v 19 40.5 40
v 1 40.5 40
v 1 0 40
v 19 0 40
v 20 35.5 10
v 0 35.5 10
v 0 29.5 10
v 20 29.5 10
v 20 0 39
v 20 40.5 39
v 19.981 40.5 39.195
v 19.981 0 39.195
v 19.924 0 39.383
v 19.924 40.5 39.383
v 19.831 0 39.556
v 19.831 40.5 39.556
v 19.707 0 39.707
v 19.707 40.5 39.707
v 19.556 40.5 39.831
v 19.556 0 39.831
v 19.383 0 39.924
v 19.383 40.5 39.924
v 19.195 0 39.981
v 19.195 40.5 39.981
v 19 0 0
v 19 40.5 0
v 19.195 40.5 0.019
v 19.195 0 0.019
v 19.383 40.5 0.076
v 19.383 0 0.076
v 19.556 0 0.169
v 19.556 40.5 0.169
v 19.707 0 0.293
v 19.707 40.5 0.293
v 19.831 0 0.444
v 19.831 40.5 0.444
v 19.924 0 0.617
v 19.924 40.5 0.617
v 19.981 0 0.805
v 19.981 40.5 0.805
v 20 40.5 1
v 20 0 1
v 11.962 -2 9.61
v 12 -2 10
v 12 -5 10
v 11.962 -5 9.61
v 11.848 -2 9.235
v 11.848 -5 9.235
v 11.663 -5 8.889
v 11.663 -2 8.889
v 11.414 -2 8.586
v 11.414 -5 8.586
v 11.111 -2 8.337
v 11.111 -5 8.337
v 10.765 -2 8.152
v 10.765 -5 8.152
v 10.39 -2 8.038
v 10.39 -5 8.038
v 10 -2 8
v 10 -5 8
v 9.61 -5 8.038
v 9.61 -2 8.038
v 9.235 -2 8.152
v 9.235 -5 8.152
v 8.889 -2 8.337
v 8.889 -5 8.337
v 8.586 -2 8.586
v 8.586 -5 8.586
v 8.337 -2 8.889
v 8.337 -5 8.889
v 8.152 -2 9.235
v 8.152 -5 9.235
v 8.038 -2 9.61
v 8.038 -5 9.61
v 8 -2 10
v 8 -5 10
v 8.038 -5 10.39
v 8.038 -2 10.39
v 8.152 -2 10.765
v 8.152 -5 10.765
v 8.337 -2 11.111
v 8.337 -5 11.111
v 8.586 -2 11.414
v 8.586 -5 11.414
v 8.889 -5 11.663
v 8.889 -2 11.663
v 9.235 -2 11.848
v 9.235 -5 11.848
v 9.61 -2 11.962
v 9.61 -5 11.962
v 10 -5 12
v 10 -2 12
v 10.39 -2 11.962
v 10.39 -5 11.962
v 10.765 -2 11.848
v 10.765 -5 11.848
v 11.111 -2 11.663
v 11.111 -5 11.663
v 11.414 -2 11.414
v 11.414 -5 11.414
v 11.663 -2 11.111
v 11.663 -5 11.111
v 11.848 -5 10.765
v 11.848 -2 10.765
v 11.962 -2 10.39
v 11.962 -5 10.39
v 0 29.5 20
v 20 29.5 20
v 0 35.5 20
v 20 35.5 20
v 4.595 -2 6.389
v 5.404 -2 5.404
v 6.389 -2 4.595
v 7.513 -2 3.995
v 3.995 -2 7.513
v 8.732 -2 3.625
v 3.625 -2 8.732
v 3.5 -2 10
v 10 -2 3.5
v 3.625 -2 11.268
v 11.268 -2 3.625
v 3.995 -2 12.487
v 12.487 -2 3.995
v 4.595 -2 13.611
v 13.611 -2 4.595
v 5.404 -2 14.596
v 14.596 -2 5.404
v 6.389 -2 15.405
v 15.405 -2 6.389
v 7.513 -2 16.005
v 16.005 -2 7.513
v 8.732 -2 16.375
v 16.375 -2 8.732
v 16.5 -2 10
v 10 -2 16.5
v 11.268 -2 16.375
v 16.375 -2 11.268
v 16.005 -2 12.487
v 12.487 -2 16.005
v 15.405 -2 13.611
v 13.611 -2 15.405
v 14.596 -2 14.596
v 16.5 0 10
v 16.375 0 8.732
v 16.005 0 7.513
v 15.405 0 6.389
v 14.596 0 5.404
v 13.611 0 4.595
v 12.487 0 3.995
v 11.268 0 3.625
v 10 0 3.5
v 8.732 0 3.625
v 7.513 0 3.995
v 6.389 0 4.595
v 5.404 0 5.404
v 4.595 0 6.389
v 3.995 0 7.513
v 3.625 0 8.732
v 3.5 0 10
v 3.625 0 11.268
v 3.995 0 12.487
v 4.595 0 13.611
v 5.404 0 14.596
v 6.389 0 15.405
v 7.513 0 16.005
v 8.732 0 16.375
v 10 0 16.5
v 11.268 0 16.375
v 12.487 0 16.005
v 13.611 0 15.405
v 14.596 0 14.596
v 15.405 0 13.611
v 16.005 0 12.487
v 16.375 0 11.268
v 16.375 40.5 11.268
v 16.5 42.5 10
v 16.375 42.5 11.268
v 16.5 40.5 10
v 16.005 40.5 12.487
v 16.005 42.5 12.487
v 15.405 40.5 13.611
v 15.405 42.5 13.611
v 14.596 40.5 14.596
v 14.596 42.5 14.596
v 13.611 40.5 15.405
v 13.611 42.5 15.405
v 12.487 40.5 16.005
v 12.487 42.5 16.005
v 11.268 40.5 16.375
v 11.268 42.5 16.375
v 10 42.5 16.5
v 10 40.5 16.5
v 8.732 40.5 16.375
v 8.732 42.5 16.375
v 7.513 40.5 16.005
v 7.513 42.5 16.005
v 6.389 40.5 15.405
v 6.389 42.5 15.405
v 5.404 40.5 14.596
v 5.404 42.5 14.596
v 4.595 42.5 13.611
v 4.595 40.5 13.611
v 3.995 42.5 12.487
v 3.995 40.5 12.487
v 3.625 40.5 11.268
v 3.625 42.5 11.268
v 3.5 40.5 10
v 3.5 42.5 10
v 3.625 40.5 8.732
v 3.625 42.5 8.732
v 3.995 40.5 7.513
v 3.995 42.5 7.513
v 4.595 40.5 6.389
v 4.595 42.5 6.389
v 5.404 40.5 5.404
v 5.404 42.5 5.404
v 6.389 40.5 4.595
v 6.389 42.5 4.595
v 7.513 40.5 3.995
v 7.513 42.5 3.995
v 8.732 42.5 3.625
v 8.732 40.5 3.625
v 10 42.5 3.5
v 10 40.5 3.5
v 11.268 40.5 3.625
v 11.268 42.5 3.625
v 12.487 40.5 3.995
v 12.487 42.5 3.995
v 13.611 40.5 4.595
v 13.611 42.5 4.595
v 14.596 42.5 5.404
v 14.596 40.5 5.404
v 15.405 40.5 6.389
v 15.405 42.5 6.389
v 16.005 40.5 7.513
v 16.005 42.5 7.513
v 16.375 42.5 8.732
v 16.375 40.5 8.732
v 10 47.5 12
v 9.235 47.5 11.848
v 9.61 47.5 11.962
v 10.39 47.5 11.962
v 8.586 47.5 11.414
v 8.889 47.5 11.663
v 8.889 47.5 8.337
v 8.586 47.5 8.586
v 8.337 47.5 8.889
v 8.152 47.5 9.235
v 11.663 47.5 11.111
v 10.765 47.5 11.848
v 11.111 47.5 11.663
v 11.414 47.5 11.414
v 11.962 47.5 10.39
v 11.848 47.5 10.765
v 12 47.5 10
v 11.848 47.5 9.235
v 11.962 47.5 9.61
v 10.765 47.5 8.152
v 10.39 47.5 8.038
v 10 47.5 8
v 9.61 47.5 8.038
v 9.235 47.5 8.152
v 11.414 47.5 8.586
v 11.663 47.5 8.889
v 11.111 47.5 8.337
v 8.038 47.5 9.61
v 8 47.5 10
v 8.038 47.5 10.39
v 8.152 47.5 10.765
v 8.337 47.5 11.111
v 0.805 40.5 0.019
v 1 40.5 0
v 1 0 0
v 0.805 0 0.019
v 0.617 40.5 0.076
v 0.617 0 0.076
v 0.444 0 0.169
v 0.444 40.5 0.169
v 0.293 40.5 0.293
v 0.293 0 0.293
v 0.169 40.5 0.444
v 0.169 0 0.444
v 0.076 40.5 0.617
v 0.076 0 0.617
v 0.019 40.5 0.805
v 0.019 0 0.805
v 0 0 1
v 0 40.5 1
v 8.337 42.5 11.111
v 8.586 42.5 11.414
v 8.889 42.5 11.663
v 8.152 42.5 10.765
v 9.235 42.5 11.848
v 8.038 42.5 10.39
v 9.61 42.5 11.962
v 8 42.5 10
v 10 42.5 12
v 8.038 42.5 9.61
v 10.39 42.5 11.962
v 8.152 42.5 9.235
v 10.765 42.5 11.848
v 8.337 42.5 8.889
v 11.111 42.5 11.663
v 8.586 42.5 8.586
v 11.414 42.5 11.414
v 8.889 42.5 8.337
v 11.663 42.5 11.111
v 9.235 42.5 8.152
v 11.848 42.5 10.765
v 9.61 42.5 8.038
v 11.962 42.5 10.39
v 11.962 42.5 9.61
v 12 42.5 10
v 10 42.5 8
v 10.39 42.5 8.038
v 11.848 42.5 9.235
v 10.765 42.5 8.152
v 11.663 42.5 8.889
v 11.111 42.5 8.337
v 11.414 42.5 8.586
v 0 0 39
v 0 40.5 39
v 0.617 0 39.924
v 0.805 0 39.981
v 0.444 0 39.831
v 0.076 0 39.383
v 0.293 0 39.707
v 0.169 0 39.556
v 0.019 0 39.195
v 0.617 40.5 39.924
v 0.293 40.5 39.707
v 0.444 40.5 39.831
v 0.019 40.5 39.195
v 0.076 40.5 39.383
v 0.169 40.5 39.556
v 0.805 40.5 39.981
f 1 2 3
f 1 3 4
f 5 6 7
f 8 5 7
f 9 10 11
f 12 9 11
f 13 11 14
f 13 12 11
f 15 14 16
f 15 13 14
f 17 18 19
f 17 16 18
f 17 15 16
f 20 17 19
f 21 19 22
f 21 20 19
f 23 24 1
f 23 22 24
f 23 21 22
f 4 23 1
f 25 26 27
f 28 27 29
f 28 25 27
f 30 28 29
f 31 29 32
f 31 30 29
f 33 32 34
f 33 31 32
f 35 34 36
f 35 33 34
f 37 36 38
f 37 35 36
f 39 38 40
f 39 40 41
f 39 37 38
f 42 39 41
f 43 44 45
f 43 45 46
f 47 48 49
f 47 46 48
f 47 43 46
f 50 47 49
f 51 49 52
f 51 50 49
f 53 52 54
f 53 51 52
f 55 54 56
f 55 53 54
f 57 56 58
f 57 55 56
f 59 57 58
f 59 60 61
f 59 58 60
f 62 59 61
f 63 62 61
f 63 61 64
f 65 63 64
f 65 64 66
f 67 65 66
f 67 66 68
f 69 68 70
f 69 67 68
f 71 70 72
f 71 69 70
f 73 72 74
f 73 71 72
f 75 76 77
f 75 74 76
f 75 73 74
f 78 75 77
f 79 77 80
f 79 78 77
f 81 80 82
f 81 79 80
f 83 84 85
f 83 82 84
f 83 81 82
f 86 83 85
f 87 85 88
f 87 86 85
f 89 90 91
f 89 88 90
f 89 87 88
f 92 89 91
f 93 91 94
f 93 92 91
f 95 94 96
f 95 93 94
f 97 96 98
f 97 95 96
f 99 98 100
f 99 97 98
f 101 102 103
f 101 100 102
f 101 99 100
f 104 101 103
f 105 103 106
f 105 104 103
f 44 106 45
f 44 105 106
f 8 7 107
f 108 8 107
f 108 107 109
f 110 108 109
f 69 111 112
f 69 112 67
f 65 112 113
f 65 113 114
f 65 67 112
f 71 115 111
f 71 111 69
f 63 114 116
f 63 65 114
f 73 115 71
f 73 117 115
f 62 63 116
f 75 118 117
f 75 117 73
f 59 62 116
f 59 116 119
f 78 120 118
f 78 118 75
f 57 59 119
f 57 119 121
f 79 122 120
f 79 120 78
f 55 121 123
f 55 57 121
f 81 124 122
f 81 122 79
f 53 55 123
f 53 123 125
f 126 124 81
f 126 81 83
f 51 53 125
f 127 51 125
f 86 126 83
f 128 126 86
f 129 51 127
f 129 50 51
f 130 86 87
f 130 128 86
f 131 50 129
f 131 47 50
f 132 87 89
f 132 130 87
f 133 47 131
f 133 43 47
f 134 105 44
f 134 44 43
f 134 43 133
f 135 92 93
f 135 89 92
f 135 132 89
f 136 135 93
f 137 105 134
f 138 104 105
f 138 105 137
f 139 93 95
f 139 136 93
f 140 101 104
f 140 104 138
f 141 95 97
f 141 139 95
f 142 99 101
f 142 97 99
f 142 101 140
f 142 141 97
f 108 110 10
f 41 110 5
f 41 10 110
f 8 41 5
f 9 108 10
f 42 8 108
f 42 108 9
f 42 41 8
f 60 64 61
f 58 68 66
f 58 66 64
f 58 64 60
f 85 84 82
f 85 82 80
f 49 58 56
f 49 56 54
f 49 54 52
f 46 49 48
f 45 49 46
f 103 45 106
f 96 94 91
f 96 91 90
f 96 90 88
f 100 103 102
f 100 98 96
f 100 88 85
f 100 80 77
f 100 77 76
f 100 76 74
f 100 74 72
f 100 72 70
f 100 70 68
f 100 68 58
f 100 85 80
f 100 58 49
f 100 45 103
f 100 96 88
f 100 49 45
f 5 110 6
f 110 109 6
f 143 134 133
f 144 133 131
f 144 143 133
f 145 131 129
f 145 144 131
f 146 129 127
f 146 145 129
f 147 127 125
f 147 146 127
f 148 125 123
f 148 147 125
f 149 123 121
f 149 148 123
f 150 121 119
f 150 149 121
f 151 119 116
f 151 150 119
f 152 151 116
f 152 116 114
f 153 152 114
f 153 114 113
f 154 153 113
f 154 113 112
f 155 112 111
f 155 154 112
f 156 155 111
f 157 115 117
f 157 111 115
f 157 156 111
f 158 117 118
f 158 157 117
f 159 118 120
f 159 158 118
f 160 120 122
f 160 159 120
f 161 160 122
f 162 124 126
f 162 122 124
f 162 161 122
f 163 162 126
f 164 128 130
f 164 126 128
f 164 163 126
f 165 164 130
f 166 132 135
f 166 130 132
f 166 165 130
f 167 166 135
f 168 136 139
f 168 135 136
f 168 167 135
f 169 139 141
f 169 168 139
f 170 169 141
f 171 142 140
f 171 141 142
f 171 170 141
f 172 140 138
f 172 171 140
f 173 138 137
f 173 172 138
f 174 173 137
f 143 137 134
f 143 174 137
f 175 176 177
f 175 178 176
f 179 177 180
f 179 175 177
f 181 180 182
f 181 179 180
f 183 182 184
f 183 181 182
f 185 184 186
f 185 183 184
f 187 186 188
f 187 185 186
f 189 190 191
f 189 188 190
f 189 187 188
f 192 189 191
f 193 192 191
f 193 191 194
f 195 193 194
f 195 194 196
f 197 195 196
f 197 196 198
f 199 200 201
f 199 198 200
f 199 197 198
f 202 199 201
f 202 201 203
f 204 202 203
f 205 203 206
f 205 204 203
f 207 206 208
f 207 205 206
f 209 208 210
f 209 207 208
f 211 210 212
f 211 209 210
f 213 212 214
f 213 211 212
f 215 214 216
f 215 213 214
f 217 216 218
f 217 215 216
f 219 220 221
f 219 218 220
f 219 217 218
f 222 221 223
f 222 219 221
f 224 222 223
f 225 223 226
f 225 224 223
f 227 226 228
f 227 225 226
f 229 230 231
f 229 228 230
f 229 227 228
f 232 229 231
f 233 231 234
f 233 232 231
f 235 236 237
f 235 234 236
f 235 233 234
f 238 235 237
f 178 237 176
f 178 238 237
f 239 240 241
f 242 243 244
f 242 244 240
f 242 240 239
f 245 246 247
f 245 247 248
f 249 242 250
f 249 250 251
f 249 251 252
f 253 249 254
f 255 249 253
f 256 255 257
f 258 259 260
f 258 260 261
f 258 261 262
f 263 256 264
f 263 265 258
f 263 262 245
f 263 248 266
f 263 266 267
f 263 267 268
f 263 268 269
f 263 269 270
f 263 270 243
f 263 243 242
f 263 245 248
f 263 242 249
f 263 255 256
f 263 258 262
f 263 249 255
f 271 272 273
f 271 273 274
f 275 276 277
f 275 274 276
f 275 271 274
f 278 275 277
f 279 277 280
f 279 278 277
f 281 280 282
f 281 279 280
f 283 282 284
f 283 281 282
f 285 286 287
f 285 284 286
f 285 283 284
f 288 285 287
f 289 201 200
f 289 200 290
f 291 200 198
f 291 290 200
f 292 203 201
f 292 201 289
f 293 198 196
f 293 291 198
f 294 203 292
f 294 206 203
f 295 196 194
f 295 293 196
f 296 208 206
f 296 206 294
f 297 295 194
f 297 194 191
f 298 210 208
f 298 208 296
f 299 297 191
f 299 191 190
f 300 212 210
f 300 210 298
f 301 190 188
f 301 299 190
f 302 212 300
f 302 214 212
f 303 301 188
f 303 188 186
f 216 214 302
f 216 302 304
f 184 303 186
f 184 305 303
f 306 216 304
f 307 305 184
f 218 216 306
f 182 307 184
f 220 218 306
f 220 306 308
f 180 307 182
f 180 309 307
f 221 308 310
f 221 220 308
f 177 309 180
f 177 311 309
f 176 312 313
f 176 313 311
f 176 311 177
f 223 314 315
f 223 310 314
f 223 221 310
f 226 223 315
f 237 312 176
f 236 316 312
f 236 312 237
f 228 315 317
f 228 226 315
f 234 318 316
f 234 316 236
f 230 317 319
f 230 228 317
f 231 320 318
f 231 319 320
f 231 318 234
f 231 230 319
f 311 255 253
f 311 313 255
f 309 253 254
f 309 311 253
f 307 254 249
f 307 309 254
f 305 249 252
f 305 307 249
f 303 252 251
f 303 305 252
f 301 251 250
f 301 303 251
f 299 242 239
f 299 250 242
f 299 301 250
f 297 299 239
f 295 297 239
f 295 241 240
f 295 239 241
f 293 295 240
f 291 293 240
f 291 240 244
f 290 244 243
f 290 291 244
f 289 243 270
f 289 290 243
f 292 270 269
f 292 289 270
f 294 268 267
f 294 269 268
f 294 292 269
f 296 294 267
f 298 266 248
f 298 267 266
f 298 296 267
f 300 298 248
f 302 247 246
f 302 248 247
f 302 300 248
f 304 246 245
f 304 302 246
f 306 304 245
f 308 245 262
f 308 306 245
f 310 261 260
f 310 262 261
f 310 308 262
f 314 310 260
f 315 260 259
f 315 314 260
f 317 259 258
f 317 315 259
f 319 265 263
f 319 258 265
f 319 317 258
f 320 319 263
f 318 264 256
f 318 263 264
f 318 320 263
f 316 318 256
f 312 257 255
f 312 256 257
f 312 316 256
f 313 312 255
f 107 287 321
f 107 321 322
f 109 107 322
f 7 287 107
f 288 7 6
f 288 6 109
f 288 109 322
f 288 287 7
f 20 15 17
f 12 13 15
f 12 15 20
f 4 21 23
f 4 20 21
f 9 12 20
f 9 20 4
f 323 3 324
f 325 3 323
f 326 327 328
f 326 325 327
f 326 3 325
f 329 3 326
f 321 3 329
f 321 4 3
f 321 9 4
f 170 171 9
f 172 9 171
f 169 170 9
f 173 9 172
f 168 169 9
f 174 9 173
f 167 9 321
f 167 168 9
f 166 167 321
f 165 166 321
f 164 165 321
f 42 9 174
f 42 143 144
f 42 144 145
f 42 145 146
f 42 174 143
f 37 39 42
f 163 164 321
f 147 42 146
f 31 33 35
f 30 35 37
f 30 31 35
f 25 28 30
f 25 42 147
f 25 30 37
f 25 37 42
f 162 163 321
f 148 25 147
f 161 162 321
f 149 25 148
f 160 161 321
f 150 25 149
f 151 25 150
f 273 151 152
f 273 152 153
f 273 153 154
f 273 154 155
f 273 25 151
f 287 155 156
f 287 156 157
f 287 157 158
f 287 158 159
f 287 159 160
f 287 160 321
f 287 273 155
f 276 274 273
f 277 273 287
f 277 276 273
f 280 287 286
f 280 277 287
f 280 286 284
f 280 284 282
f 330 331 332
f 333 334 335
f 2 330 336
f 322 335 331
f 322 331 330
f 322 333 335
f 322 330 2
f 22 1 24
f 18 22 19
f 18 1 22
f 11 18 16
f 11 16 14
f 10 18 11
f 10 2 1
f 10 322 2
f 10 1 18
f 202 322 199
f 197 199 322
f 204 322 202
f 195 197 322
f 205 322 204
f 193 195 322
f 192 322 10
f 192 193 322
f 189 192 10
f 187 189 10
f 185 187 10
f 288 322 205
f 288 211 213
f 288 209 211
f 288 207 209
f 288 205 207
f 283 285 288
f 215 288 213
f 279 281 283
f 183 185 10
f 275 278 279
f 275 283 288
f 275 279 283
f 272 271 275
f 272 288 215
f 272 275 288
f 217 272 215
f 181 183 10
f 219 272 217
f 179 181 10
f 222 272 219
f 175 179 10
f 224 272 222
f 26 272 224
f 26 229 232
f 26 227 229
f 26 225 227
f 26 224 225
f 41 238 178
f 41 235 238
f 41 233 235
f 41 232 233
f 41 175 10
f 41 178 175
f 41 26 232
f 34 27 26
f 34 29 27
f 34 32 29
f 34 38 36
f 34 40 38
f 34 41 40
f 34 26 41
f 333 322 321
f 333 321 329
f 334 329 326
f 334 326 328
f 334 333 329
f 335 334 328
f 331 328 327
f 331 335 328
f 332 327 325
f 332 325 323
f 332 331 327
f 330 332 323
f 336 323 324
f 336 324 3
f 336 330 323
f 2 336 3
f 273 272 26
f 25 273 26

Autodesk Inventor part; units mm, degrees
ref_plane "YZ Plane" through (0, 0, 0) normal (1, 0, 0) x (0, 1, 0)
ref_plane "XZ Plane" through (0, 0, 0) normal (0, 1, 0) x (-1, 0, 0)
ref_plane "XY Plane" through (0, 0, 0) normal (0, 0, 1) x (1, 0, 0)
sketch "Sketch1" plane through (0, 0, 0) normal (0, 0, 1) x (1, 0, 0)
  line L0 (0, 0) -> (0, 40.5)
  line L1 (0, 40.5) -> (20, 40.5)
  line L2 (20, 40.5) -> (20, 0)
  line L3 (20, 0) -> (0, 0)
  dimension "d0" = 40.5
  dimension "d1" = 20
extrude "Extrusion1" add sketch "Sketch1" along normal blind 40
sketch "Sketch2" plane through (0, 40.5, 0) normal (0, 1, 0) x (1, 0, 0)
  line L0 (20, 0) -> (0, 0) projected
  line L1 (10, 0) -> (10, -10)
  circle A0 centre (10, -10) radius 5
  dimension "d4" = 10
  dimension "d5" = 10
extrude "Extrusion2" add sketch "Sketch2" along normal blind 1
sketch "Sketch3" plane through (10, 41.5, 10) normal (0, 1, 0) x (1, 0, 0)
  circle A0 centre (0, 0) radius 2
  point P0 (-10, 10)
  dimension "d8" = 4
extrude "Extrusion3" add sketch "Sketch3" along normal blind 6
fillet "Fillet1" radius 1 4 edges at (0, 20.25, 40) (20, 20.25, 40) (20, 20.25, 0) (0, 20.25, 0)
sketch "Sketch4" plane through (1, 0, 0) normal (0, -1, 0) x (1, 0, 0)
  line L0 (18, 0) -> (0, 0) projected
  line L1 (9, 0) -> (9, 10)
  circle A0 centre (9, 10) radius 5
  point P0 (-1, 0)
  dimension "d12" = 10
  dimension "d13" = 10
extrude "Extrusion4" add sketch "Sketch4" along normal blind 1
sketch "Sketch5" plane through (10, -1, 10) normal (0, -1, 0) x (1, 0, 0)
  circle A0 centre (0, 0) radius 2
  point P0 (-10, -10)
  dimension "d16" = 4
extrude "Extrusion5" add sketch "Sketch5" along normal blind 4
sketch "Boceto6" plane through (0, 0, 1) normal (-1, 0, 0) x (0, 0, 1)
  line L0 (-1, 0) -> (-1, 40.5) projected
  line L1 (-1, 40.5) -> (-1, 35.5)
  line L2 (-1, 35.5) -> (9, 35.5)
  line L3 (9, 35.5) -> (9, 29.5)
  line L4 (9, 29.5) -> (19, 29.5)
  line L5 (19, 29.5) -> (19, 35.5)
  line L6 (19, 35.5) -> (9, 35.5)
  dimension "d19" = 5
  dimension "d20" = 10
  dimension "d21" = 6
  dimension "d22" = 10
extrude "Extrusión6" cut sketch "Boceto6" against normal up to next
sketch "Boceto7" plane through (1, 0, 0) normal (0, -1, 0) x (1, 0, 0)
  line L0 (-1, 10) -> (19, 10) projected
  circle A0 centre (9, 10) radius 6.5
  circle A1 centre (9, 10) radius 2
  point P0 (-1, 0)
  dimension "d25" = 13
extrude "Extrusión8" add sketch "Boceto7" along normal blind 2 contours A1 L0 A0 | L0 A0 A1
sketch "Boceto8" plane through (1, 40.5, 0) normal (0, 1, 0) x (1, 0, 0)
  circle A0 centre (9, -10) radius 2 projected
  circle A1 centre (9, -10) radius 6.5
  circle A2 centre (9, -10) radius 6.5 projected
  circle A3 centre (9, -10) radius 2
  point P0 (-1, 0)
  dimension "d30" = 13
extrude "Extrusión9" add sketch "Boceto8" along normal blind 2
properties part number "servo_FT_SC"
